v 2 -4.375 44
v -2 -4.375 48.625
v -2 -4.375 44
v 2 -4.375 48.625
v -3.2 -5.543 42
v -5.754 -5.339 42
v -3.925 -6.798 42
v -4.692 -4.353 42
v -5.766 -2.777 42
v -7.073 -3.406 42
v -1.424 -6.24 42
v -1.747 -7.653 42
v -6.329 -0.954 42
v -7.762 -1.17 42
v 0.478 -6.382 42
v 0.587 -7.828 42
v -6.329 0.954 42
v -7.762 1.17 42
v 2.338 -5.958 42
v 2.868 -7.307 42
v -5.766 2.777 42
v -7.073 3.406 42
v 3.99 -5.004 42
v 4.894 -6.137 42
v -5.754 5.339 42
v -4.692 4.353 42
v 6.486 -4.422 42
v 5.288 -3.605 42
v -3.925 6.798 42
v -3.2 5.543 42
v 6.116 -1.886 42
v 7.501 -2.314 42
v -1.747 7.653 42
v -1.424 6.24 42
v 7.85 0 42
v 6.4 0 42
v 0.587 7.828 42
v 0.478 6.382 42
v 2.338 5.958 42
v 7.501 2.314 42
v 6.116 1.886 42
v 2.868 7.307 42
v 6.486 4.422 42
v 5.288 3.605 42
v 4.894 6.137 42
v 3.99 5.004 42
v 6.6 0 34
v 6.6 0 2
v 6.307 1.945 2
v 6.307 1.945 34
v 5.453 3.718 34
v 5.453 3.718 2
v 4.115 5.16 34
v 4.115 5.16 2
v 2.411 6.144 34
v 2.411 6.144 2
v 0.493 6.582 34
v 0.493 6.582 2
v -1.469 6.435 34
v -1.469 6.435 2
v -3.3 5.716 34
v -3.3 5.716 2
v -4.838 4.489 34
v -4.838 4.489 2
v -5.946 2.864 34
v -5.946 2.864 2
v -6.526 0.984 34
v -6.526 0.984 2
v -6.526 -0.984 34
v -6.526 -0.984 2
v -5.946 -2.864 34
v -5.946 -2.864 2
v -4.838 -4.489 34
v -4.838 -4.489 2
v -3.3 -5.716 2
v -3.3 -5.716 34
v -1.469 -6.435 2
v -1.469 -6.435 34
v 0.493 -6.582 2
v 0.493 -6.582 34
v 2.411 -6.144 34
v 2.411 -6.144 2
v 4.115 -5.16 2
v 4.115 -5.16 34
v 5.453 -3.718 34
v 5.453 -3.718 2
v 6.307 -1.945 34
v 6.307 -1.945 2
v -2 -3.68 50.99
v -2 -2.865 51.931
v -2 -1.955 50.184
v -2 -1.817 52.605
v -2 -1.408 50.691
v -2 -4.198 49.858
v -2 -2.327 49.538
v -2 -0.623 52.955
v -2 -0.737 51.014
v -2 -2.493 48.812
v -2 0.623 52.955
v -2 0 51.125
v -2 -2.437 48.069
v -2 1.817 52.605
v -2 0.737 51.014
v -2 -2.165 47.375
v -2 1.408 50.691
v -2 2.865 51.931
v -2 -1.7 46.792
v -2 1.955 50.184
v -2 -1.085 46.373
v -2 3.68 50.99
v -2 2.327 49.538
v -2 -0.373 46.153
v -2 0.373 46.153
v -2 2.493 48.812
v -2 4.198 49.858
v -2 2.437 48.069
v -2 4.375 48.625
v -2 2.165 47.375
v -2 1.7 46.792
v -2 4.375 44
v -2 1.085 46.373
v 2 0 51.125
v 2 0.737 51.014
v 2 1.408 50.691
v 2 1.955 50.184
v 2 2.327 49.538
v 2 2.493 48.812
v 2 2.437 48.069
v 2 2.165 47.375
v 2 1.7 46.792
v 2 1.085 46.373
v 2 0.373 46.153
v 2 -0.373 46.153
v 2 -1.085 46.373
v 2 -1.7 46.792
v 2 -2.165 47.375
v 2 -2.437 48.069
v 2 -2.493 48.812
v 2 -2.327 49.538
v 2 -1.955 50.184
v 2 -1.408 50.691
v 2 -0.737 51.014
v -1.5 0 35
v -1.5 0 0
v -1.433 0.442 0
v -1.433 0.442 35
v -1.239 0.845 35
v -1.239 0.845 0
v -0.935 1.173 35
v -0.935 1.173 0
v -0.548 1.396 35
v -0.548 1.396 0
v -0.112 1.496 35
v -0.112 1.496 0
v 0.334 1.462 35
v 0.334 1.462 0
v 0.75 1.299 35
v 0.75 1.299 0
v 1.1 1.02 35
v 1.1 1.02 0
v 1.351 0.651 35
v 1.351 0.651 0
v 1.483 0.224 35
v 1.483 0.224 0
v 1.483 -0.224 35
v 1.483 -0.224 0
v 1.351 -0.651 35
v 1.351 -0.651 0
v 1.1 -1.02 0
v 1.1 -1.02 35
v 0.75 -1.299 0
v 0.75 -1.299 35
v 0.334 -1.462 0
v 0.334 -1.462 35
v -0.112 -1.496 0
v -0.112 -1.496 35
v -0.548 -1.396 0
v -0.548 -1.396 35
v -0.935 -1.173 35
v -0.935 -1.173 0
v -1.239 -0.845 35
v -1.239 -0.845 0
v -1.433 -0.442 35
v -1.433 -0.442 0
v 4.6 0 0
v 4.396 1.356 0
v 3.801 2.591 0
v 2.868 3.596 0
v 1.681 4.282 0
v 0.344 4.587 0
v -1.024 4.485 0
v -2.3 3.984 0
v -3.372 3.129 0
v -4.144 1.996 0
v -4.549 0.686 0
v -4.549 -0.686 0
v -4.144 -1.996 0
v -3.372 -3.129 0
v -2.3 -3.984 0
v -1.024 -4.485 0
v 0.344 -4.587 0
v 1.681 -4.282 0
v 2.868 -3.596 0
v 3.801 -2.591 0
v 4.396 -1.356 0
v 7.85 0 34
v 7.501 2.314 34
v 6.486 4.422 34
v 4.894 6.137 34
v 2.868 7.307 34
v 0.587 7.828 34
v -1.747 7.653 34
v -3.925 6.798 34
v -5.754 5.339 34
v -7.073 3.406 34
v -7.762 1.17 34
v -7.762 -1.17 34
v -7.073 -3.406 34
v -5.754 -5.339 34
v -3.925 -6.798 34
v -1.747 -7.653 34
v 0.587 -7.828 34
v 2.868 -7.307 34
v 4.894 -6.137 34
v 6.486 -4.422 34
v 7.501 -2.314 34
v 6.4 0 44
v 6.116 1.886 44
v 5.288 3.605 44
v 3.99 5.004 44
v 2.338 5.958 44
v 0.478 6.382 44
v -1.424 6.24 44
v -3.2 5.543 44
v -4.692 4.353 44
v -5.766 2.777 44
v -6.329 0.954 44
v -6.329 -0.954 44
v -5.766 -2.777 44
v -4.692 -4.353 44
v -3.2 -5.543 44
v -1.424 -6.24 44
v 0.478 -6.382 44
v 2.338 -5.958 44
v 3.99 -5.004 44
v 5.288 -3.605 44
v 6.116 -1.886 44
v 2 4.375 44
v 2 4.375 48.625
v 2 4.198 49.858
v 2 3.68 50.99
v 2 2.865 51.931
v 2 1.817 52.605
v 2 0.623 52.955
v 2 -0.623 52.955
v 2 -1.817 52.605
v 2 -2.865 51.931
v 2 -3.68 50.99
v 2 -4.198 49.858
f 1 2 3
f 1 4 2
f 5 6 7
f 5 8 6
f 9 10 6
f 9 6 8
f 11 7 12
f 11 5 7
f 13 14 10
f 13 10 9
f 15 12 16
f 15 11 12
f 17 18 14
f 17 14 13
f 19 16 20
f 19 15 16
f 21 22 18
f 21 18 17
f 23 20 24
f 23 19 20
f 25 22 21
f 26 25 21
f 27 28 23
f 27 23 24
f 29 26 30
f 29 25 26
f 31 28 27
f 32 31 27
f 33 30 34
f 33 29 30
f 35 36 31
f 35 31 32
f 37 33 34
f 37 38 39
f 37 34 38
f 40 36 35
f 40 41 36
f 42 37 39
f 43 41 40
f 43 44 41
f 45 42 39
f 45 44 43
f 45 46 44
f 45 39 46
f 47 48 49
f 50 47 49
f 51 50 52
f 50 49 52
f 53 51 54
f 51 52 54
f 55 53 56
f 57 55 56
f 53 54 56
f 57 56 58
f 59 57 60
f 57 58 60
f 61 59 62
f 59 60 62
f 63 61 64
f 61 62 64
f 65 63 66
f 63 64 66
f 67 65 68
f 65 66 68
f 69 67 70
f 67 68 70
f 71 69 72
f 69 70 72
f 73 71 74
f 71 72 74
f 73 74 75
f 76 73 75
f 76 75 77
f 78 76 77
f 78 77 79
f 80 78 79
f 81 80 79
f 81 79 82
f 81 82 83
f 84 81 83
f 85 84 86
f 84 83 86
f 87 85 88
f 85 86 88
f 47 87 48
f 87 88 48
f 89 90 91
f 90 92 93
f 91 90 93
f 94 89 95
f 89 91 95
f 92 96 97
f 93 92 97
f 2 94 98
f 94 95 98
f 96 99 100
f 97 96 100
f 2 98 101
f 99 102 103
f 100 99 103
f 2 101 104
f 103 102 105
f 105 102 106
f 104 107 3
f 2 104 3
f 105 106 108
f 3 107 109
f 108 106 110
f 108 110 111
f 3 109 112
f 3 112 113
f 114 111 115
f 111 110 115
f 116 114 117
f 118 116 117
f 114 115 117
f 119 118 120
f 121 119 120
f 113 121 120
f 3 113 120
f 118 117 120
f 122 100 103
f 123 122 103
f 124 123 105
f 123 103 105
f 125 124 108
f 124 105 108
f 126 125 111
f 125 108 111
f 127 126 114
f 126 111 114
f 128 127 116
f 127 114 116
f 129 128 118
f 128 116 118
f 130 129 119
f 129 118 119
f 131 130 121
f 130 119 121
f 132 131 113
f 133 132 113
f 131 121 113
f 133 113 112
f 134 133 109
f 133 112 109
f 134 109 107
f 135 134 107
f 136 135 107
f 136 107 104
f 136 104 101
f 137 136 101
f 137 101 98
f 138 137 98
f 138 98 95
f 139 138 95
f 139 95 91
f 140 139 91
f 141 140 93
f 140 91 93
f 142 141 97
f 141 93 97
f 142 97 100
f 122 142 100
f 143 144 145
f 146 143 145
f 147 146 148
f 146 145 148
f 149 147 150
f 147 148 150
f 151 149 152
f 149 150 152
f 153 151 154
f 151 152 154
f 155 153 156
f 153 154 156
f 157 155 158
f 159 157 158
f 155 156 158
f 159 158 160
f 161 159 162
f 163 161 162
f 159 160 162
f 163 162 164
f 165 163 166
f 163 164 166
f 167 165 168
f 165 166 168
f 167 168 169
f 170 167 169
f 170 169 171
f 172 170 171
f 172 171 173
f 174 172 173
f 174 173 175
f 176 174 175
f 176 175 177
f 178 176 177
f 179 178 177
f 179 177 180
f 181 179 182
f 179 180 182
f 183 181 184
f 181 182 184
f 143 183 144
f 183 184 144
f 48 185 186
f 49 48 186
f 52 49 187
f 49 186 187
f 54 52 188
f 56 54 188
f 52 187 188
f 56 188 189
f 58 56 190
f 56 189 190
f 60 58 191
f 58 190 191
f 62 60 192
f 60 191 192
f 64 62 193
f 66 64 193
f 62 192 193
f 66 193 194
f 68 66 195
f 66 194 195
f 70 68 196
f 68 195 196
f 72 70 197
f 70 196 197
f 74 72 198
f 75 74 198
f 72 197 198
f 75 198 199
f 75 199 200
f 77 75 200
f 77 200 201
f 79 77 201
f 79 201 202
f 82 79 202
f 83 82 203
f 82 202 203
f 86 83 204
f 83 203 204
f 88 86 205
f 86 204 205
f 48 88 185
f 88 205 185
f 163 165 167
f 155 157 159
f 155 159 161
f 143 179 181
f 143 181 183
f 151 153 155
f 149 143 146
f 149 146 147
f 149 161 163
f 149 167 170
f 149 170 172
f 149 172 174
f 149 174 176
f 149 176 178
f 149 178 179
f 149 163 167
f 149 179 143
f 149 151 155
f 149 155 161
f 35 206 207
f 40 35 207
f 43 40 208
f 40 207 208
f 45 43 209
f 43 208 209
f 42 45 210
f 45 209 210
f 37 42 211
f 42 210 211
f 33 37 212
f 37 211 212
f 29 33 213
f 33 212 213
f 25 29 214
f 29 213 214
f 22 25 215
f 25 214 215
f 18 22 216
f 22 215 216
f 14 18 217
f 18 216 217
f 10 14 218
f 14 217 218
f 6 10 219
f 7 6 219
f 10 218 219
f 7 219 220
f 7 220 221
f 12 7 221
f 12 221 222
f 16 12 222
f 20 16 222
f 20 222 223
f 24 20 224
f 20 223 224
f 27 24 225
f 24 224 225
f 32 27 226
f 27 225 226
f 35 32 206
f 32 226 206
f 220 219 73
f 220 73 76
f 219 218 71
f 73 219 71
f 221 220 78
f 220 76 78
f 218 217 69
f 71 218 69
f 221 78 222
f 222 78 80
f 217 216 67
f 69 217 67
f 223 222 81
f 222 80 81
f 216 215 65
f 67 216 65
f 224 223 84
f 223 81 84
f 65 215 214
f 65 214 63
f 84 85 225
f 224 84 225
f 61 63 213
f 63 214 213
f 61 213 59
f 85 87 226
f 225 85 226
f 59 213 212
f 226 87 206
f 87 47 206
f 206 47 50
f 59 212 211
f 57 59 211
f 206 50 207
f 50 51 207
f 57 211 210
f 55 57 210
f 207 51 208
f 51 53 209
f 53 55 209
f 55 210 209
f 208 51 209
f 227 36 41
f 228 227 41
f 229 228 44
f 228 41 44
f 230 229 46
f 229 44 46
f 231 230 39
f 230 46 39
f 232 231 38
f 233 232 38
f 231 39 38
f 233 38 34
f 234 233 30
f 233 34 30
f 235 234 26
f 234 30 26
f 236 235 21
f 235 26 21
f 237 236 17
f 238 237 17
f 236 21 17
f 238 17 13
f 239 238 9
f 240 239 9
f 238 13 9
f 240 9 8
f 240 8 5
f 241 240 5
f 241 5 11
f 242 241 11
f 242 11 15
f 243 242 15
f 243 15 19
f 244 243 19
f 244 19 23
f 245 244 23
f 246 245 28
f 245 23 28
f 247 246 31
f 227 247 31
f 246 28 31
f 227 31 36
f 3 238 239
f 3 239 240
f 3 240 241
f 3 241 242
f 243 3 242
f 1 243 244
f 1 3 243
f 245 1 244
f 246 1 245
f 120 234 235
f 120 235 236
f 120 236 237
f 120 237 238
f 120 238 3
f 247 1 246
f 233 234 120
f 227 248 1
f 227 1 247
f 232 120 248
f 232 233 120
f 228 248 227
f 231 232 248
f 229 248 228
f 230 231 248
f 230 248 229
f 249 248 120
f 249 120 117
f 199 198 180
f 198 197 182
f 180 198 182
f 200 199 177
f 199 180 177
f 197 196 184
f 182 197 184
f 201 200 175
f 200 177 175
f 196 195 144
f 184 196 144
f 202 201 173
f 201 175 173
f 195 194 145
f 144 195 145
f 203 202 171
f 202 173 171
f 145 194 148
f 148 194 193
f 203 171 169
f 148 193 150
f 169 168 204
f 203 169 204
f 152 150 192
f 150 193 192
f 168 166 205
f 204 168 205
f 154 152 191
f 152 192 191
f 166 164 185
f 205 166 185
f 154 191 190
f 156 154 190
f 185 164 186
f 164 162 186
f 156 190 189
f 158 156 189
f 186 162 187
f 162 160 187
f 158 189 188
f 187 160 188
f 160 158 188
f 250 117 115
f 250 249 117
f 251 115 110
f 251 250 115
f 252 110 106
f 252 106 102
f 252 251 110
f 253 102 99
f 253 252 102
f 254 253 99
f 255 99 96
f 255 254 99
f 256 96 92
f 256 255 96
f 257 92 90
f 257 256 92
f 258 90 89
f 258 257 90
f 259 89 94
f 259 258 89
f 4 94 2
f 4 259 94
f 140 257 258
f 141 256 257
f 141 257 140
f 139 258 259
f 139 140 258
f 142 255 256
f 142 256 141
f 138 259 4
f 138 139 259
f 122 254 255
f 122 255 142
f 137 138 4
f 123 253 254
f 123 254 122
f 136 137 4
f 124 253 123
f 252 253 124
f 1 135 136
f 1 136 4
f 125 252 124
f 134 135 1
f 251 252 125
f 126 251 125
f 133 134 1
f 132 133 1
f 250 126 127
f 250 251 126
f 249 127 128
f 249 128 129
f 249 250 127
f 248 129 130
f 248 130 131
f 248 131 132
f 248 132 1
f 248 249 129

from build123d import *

# Parameters (mm, degrees)
SKETCH2_R            = 6.6
EXTERNAL_SHOCK_DEPTH = 34
SHOCK_CHAMFER_SIZE   = 2
SKETCH3_R            = 7.85
CYLINDER_A_DEPTH     = 8
SKETCH4_R            = 6.4
CYLINDER_B_DEPTH     = 2
MOUNTING_BOSS_DEPTH  = 2
SKETCH6_R            = 2.5
MOUNTING_HOLE_DEPTH  = 4
SKETCH7_R            = 1.5
INNER_HOLE_DEPTH     = 35


with BuildPart() as part:
    # Sketch2 → External Shock (new body)
    with BuildSketch(Plane.XY):
        Circle(SKETCH2_R)
    extrude(amount=EXTERNAL_SHOCK_DEPTH)

    # Shock Chamfer
    shock_chamfer_edges = [part.edges().sort_by_distance(p)[0] for p in [
        (-6.6, 0, 0),
    ]]
    chamfer(shock_chamfer_edges, length=SHOCK_CHAMFER_SIZE)

    # Sketch3 → Cylinder A (add)
    with BuildSketch(Plane.XY.offset(34)):
        Circle(SKETCH3_R)
    extrude(amount=CYLINDER_A_DEPTH)

    # Sketch4 → Cylinder B (add)
    with BuildSketch(Plane.XY.offset(42)):
        Circle(SKETCH4_R)
    extrude(amount=CYLINDER_B_DEPTH)

    # Sketch5 → Mounting Boss (add, symmetric)
    with BuildSketch(Plane(origin=(0, 0, 0), x_dir=(0, 0, -1), z_dir=(1, 0, 0))):
        with BuildLine():
            Line((-48.625, -4.375), (-44, -4.375))
            Line((-44, -4.375), (-44, 4.375))
            Line((-44, 4.375), (-48.625, 4.375))
            ThreePointArc((-48.625, 4.375), (-53, 0), (-48.625, -4.375))
        make_face()
    extrude(amount=MOUNTING_BOSS_DEPTH, both=True)

    # Sketch6 → Mounting Hole (cut)
    with BuildSketch(Plane.ZY.offset(2)):
        with Locations((48.625, 0)):
            Circle(SKETCH6_R)
    extrude(amount=-MOUNTING_HOLE_DEPTH, mode=Mode.SUBTRACT)

    # Sketch7 → Inner Hole (cut)
    with BuildSketch(Plane(origin=(0, 0, 0), x_dir=(-1, 0, 0), z_dir=(0, 0, -1))):
        Circle(SKETCH7_R)
    extrude(amount=-INNER_HOLE_DEPTH, mode=Mode.SUBTRACT)


solid = part.part
